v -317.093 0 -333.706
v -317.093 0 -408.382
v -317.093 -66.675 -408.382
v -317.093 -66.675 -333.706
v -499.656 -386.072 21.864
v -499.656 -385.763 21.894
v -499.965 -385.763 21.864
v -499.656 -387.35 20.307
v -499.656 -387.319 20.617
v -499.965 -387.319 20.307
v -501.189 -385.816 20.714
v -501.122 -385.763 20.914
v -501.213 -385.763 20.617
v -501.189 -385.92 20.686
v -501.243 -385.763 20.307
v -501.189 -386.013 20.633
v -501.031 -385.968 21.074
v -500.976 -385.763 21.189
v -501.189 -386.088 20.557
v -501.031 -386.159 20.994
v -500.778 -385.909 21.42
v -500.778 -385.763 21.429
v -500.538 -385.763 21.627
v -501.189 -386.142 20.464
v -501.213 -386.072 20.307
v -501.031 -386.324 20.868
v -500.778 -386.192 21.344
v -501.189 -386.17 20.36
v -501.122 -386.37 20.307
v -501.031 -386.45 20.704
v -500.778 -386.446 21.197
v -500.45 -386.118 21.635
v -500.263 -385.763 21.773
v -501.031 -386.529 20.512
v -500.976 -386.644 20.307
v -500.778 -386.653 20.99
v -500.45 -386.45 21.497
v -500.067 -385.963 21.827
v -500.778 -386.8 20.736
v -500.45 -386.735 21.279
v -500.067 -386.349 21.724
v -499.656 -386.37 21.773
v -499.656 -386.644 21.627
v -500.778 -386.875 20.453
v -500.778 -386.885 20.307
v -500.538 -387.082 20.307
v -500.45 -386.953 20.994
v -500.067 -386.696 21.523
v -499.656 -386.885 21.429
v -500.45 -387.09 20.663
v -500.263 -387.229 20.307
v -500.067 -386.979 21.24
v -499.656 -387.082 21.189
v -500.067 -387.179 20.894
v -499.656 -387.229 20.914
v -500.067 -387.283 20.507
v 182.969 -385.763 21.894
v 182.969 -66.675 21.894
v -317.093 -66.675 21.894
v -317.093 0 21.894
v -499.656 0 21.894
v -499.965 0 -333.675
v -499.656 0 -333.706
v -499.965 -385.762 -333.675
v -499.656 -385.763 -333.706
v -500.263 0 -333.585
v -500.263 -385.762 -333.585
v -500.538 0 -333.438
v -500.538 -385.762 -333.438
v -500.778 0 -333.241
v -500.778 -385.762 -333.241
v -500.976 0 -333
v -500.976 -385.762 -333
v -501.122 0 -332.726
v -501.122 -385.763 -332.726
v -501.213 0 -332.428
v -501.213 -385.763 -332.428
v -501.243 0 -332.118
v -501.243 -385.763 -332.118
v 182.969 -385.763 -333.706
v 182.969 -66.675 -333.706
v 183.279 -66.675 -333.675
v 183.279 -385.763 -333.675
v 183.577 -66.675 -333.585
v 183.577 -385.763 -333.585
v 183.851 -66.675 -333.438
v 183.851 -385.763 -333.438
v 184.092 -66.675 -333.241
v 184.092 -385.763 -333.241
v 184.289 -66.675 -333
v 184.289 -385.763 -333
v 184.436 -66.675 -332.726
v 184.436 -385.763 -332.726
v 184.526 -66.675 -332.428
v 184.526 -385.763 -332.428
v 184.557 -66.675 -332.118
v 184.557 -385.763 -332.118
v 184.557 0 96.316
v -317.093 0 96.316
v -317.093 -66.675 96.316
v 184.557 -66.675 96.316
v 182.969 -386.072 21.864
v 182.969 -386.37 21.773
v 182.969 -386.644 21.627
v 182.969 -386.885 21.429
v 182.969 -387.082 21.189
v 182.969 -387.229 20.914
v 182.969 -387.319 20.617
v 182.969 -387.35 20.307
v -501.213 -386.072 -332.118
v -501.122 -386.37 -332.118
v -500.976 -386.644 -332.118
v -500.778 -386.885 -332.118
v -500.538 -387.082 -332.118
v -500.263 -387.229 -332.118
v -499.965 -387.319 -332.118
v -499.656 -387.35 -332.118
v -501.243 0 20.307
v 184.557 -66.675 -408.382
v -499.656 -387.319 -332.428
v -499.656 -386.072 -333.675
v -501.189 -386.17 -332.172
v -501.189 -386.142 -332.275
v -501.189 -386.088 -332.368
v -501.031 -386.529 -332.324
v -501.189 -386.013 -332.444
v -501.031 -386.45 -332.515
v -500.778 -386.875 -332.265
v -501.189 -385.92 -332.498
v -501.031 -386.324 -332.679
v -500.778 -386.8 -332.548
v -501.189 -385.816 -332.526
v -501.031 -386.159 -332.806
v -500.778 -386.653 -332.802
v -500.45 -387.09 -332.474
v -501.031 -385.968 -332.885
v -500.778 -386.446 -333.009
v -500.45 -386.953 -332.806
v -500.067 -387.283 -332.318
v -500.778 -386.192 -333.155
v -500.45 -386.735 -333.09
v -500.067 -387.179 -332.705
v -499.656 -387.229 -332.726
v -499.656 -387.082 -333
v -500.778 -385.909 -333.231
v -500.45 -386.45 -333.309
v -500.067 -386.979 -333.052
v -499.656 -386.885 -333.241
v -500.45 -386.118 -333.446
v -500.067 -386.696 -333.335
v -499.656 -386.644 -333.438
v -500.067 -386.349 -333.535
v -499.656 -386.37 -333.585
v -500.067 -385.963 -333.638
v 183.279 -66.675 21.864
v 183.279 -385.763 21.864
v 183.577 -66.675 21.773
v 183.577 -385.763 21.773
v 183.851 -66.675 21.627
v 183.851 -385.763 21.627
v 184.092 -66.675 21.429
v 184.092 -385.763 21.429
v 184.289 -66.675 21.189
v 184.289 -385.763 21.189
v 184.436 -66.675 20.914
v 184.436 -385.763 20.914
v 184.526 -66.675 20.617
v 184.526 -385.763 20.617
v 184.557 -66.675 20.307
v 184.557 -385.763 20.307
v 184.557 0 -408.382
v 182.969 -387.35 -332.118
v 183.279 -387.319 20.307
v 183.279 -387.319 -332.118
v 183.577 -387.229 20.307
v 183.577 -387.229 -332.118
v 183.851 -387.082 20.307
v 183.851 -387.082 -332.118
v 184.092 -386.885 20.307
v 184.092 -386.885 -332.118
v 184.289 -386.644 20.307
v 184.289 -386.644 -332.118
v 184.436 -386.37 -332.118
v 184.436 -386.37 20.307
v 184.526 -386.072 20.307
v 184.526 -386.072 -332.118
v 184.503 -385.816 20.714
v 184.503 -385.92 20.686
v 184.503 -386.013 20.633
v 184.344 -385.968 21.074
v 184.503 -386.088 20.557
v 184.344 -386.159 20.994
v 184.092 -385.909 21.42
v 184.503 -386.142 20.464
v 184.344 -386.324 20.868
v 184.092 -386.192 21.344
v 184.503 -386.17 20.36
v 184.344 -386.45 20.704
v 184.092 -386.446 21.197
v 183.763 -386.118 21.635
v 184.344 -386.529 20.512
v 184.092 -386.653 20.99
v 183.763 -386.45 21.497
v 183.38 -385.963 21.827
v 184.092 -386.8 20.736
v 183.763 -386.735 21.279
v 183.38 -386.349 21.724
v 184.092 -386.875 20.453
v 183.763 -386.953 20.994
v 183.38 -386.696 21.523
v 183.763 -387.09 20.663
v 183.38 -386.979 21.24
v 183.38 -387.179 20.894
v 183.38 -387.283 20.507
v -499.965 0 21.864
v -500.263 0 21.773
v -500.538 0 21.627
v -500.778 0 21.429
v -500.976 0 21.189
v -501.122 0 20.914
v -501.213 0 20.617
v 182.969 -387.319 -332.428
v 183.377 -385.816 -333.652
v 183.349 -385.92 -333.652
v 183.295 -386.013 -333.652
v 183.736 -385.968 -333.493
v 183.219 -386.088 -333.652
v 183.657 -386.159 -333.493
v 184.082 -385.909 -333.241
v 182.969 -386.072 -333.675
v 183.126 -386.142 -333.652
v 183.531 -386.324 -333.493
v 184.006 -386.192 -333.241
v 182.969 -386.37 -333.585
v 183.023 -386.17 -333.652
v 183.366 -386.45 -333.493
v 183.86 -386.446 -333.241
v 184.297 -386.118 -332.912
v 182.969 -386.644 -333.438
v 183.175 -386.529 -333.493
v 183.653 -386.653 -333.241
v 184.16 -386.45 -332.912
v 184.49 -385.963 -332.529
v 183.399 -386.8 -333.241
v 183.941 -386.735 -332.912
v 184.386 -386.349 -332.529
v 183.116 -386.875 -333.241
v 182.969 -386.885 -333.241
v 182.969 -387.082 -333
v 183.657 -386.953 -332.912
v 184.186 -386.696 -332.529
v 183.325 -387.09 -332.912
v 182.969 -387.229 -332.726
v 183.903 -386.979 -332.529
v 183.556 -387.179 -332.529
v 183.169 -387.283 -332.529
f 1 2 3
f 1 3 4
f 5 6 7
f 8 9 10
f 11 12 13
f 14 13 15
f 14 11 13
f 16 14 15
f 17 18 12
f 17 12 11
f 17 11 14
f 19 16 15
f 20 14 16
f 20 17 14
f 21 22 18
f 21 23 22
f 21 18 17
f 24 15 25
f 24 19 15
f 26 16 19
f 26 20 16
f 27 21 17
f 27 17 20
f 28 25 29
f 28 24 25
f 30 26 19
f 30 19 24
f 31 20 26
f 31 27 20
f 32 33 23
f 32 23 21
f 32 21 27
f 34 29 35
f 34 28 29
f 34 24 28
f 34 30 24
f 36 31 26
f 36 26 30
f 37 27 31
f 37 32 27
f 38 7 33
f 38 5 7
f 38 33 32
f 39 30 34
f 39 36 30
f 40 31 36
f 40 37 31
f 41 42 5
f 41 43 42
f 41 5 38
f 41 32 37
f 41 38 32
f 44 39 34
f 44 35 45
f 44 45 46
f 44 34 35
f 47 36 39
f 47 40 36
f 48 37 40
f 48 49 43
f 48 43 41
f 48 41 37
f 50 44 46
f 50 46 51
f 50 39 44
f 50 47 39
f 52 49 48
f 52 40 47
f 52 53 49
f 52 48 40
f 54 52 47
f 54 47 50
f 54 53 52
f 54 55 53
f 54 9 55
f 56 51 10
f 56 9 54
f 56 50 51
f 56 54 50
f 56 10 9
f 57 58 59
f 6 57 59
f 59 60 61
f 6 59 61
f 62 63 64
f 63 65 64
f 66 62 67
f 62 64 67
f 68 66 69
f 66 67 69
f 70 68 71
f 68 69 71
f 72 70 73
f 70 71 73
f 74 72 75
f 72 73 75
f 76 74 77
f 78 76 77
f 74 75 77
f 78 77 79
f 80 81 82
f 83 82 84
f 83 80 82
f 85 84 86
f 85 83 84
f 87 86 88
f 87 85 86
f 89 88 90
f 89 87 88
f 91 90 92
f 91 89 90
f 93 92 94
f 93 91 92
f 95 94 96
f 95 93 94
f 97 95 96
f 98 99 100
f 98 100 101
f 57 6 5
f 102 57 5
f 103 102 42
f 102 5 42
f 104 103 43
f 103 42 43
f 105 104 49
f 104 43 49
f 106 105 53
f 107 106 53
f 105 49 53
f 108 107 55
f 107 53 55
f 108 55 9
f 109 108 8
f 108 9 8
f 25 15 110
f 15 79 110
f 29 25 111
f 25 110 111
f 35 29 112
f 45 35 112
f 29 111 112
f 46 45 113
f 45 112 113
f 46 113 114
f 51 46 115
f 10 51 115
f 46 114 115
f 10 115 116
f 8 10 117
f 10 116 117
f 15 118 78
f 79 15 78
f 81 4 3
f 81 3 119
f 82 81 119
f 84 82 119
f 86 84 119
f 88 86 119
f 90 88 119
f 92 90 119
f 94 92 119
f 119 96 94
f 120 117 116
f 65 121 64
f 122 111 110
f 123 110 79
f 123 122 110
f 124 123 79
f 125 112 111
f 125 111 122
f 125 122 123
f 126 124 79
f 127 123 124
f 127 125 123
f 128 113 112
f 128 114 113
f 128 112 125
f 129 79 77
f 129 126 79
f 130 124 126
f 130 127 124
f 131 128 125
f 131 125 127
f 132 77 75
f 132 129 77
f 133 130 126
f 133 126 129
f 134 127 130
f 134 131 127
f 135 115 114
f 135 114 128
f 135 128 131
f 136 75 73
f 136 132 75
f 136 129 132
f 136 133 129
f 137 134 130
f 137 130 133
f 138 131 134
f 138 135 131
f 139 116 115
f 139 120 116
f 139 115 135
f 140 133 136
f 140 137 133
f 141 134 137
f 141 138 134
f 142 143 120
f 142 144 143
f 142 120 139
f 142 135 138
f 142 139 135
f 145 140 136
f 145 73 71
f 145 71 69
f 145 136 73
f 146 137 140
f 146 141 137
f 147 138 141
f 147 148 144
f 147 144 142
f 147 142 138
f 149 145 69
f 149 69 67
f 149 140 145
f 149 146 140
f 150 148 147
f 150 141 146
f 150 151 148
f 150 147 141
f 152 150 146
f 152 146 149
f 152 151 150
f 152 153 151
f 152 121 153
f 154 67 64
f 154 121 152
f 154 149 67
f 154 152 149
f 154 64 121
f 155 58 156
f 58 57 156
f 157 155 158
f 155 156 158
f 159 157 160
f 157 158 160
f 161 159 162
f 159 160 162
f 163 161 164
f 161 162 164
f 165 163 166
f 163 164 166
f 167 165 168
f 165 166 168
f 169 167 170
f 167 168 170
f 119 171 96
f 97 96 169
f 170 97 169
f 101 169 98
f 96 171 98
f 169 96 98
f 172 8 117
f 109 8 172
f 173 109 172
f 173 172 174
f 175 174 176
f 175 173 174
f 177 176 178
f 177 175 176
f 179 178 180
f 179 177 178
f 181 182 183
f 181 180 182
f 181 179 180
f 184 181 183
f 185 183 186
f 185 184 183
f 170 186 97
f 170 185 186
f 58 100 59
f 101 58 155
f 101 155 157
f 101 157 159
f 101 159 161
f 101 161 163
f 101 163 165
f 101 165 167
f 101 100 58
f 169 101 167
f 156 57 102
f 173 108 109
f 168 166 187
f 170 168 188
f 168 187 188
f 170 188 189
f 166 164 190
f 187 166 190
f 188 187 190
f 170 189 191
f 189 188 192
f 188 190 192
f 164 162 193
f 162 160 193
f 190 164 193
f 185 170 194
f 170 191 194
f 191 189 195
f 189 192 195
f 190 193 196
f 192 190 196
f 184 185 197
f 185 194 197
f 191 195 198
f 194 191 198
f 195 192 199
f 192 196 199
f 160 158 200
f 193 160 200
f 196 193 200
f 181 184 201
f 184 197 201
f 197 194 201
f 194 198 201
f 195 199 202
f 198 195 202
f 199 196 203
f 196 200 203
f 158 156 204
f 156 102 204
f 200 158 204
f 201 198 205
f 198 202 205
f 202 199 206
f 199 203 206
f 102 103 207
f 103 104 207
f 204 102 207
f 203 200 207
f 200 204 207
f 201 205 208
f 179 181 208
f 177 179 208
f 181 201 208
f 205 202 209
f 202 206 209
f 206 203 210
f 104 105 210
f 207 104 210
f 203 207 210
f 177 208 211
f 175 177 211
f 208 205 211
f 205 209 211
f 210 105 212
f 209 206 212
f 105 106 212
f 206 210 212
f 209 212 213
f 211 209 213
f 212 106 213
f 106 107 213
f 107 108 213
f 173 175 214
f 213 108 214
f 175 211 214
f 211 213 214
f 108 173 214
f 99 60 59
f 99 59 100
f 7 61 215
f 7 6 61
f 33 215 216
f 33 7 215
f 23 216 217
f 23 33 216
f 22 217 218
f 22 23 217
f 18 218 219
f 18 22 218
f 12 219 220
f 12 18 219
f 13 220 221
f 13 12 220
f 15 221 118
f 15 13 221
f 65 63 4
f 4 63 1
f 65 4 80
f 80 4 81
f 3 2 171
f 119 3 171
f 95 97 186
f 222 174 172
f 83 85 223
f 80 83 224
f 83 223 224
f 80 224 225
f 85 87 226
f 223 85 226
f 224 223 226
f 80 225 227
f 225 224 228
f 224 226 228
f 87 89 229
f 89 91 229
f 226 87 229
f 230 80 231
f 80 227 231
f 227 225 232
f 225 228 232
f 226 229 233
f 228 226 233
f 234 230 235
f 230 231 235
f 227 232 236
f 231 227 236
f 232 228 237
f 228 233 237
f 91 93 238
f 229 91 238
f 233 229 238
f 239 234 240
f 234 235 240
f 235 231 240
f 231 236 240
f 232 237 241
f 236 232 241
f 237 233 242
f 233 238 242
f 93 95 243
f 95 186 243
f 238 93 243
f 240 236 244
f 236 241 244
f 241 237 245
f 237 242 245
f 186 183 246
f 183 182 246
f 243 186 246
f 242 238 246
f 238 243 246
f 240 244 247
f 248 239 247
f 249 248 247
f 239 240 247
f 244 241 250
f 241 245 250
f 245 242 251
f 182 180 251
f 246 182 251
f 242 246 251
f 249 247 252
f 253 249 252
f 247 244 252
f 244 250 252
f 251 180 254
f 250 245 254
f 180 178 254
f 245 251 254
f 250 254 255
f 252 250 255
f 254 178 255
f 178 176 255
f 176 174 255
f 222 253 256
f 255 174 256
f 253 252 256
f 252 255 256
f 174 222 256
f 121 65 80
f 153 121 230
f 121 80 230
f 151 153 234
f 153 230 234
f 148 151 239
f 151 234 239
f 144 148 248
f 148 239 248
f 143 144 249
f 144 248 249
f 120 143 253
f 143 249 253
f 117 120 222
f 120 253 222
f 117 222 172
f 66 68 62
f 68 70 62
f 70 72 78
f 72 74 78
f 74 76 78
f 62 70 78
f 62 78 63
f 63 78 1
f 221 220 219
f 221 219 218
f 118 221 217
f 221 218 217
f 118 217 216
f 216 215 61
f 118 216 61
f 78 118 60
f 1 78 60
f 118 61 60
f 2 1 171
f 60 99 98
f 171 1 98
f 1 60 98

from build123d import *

# Parameters (mm, degrees)
F0_W     = 501.65
F0_H     = 74.422
F0_H_2   = 74.676
F1_DEPTH = 66.675
F2_DEPTH = 387.35
F3_R     = 1.5875


with BuildPart() as f1:
    # F0 (on Front) → F1 (new body)
    with BuildSketch(Plane.XZ):
        with Locations((-66.268259, 59.105321)):
            Rectangle(F0_W, F0_H)
        Polygon((-317.093259, 21.894321), (-501.243259, 21.894321), (-501.243259, -333.705679), (-317.093259, -333.705679), (184.556741, -333.705679), (184.556741, 21.894321), align=None)
        with Locations((-66.268259, -371.043679)):
            Rectangle(F0_W, F0_H_2)
    extrude(amount=F1_DEPTH)

    # F0 (on Front) → F2 (join)
    with BuildSketch(Plane.XZ):
        Polygon((-317.093259, 21.894321), (-501.243259, 21.894321), (-501.243259, -333.705679), (-317.093259, -333.705679), (184.556741, -333.705679), (184.556741, 21.894321), align=None)
    extrude(amount=F2_DEPTH)

    # F3
    f3_edges = [f1.edges().sort_by_distance(p)[0] for p in [
        (-158.343259, -387.35, 21.894321),
        (-501.243259, -193.675, 21.894321),
        (184.556741, -227.0125, 21.894321),
        (184.556741, -387.35, -155.905679),
        (184.556741, -227.0125, -333.705679),
        (-158.343259, -387.35, -333.705679),
        (-501.243259, -387.35, -155.905679),
        (-501.243259, -193.675, -333.705679),
    ]]
    fillet(f3_edges, radius=F3_R)


solid = f1.part
